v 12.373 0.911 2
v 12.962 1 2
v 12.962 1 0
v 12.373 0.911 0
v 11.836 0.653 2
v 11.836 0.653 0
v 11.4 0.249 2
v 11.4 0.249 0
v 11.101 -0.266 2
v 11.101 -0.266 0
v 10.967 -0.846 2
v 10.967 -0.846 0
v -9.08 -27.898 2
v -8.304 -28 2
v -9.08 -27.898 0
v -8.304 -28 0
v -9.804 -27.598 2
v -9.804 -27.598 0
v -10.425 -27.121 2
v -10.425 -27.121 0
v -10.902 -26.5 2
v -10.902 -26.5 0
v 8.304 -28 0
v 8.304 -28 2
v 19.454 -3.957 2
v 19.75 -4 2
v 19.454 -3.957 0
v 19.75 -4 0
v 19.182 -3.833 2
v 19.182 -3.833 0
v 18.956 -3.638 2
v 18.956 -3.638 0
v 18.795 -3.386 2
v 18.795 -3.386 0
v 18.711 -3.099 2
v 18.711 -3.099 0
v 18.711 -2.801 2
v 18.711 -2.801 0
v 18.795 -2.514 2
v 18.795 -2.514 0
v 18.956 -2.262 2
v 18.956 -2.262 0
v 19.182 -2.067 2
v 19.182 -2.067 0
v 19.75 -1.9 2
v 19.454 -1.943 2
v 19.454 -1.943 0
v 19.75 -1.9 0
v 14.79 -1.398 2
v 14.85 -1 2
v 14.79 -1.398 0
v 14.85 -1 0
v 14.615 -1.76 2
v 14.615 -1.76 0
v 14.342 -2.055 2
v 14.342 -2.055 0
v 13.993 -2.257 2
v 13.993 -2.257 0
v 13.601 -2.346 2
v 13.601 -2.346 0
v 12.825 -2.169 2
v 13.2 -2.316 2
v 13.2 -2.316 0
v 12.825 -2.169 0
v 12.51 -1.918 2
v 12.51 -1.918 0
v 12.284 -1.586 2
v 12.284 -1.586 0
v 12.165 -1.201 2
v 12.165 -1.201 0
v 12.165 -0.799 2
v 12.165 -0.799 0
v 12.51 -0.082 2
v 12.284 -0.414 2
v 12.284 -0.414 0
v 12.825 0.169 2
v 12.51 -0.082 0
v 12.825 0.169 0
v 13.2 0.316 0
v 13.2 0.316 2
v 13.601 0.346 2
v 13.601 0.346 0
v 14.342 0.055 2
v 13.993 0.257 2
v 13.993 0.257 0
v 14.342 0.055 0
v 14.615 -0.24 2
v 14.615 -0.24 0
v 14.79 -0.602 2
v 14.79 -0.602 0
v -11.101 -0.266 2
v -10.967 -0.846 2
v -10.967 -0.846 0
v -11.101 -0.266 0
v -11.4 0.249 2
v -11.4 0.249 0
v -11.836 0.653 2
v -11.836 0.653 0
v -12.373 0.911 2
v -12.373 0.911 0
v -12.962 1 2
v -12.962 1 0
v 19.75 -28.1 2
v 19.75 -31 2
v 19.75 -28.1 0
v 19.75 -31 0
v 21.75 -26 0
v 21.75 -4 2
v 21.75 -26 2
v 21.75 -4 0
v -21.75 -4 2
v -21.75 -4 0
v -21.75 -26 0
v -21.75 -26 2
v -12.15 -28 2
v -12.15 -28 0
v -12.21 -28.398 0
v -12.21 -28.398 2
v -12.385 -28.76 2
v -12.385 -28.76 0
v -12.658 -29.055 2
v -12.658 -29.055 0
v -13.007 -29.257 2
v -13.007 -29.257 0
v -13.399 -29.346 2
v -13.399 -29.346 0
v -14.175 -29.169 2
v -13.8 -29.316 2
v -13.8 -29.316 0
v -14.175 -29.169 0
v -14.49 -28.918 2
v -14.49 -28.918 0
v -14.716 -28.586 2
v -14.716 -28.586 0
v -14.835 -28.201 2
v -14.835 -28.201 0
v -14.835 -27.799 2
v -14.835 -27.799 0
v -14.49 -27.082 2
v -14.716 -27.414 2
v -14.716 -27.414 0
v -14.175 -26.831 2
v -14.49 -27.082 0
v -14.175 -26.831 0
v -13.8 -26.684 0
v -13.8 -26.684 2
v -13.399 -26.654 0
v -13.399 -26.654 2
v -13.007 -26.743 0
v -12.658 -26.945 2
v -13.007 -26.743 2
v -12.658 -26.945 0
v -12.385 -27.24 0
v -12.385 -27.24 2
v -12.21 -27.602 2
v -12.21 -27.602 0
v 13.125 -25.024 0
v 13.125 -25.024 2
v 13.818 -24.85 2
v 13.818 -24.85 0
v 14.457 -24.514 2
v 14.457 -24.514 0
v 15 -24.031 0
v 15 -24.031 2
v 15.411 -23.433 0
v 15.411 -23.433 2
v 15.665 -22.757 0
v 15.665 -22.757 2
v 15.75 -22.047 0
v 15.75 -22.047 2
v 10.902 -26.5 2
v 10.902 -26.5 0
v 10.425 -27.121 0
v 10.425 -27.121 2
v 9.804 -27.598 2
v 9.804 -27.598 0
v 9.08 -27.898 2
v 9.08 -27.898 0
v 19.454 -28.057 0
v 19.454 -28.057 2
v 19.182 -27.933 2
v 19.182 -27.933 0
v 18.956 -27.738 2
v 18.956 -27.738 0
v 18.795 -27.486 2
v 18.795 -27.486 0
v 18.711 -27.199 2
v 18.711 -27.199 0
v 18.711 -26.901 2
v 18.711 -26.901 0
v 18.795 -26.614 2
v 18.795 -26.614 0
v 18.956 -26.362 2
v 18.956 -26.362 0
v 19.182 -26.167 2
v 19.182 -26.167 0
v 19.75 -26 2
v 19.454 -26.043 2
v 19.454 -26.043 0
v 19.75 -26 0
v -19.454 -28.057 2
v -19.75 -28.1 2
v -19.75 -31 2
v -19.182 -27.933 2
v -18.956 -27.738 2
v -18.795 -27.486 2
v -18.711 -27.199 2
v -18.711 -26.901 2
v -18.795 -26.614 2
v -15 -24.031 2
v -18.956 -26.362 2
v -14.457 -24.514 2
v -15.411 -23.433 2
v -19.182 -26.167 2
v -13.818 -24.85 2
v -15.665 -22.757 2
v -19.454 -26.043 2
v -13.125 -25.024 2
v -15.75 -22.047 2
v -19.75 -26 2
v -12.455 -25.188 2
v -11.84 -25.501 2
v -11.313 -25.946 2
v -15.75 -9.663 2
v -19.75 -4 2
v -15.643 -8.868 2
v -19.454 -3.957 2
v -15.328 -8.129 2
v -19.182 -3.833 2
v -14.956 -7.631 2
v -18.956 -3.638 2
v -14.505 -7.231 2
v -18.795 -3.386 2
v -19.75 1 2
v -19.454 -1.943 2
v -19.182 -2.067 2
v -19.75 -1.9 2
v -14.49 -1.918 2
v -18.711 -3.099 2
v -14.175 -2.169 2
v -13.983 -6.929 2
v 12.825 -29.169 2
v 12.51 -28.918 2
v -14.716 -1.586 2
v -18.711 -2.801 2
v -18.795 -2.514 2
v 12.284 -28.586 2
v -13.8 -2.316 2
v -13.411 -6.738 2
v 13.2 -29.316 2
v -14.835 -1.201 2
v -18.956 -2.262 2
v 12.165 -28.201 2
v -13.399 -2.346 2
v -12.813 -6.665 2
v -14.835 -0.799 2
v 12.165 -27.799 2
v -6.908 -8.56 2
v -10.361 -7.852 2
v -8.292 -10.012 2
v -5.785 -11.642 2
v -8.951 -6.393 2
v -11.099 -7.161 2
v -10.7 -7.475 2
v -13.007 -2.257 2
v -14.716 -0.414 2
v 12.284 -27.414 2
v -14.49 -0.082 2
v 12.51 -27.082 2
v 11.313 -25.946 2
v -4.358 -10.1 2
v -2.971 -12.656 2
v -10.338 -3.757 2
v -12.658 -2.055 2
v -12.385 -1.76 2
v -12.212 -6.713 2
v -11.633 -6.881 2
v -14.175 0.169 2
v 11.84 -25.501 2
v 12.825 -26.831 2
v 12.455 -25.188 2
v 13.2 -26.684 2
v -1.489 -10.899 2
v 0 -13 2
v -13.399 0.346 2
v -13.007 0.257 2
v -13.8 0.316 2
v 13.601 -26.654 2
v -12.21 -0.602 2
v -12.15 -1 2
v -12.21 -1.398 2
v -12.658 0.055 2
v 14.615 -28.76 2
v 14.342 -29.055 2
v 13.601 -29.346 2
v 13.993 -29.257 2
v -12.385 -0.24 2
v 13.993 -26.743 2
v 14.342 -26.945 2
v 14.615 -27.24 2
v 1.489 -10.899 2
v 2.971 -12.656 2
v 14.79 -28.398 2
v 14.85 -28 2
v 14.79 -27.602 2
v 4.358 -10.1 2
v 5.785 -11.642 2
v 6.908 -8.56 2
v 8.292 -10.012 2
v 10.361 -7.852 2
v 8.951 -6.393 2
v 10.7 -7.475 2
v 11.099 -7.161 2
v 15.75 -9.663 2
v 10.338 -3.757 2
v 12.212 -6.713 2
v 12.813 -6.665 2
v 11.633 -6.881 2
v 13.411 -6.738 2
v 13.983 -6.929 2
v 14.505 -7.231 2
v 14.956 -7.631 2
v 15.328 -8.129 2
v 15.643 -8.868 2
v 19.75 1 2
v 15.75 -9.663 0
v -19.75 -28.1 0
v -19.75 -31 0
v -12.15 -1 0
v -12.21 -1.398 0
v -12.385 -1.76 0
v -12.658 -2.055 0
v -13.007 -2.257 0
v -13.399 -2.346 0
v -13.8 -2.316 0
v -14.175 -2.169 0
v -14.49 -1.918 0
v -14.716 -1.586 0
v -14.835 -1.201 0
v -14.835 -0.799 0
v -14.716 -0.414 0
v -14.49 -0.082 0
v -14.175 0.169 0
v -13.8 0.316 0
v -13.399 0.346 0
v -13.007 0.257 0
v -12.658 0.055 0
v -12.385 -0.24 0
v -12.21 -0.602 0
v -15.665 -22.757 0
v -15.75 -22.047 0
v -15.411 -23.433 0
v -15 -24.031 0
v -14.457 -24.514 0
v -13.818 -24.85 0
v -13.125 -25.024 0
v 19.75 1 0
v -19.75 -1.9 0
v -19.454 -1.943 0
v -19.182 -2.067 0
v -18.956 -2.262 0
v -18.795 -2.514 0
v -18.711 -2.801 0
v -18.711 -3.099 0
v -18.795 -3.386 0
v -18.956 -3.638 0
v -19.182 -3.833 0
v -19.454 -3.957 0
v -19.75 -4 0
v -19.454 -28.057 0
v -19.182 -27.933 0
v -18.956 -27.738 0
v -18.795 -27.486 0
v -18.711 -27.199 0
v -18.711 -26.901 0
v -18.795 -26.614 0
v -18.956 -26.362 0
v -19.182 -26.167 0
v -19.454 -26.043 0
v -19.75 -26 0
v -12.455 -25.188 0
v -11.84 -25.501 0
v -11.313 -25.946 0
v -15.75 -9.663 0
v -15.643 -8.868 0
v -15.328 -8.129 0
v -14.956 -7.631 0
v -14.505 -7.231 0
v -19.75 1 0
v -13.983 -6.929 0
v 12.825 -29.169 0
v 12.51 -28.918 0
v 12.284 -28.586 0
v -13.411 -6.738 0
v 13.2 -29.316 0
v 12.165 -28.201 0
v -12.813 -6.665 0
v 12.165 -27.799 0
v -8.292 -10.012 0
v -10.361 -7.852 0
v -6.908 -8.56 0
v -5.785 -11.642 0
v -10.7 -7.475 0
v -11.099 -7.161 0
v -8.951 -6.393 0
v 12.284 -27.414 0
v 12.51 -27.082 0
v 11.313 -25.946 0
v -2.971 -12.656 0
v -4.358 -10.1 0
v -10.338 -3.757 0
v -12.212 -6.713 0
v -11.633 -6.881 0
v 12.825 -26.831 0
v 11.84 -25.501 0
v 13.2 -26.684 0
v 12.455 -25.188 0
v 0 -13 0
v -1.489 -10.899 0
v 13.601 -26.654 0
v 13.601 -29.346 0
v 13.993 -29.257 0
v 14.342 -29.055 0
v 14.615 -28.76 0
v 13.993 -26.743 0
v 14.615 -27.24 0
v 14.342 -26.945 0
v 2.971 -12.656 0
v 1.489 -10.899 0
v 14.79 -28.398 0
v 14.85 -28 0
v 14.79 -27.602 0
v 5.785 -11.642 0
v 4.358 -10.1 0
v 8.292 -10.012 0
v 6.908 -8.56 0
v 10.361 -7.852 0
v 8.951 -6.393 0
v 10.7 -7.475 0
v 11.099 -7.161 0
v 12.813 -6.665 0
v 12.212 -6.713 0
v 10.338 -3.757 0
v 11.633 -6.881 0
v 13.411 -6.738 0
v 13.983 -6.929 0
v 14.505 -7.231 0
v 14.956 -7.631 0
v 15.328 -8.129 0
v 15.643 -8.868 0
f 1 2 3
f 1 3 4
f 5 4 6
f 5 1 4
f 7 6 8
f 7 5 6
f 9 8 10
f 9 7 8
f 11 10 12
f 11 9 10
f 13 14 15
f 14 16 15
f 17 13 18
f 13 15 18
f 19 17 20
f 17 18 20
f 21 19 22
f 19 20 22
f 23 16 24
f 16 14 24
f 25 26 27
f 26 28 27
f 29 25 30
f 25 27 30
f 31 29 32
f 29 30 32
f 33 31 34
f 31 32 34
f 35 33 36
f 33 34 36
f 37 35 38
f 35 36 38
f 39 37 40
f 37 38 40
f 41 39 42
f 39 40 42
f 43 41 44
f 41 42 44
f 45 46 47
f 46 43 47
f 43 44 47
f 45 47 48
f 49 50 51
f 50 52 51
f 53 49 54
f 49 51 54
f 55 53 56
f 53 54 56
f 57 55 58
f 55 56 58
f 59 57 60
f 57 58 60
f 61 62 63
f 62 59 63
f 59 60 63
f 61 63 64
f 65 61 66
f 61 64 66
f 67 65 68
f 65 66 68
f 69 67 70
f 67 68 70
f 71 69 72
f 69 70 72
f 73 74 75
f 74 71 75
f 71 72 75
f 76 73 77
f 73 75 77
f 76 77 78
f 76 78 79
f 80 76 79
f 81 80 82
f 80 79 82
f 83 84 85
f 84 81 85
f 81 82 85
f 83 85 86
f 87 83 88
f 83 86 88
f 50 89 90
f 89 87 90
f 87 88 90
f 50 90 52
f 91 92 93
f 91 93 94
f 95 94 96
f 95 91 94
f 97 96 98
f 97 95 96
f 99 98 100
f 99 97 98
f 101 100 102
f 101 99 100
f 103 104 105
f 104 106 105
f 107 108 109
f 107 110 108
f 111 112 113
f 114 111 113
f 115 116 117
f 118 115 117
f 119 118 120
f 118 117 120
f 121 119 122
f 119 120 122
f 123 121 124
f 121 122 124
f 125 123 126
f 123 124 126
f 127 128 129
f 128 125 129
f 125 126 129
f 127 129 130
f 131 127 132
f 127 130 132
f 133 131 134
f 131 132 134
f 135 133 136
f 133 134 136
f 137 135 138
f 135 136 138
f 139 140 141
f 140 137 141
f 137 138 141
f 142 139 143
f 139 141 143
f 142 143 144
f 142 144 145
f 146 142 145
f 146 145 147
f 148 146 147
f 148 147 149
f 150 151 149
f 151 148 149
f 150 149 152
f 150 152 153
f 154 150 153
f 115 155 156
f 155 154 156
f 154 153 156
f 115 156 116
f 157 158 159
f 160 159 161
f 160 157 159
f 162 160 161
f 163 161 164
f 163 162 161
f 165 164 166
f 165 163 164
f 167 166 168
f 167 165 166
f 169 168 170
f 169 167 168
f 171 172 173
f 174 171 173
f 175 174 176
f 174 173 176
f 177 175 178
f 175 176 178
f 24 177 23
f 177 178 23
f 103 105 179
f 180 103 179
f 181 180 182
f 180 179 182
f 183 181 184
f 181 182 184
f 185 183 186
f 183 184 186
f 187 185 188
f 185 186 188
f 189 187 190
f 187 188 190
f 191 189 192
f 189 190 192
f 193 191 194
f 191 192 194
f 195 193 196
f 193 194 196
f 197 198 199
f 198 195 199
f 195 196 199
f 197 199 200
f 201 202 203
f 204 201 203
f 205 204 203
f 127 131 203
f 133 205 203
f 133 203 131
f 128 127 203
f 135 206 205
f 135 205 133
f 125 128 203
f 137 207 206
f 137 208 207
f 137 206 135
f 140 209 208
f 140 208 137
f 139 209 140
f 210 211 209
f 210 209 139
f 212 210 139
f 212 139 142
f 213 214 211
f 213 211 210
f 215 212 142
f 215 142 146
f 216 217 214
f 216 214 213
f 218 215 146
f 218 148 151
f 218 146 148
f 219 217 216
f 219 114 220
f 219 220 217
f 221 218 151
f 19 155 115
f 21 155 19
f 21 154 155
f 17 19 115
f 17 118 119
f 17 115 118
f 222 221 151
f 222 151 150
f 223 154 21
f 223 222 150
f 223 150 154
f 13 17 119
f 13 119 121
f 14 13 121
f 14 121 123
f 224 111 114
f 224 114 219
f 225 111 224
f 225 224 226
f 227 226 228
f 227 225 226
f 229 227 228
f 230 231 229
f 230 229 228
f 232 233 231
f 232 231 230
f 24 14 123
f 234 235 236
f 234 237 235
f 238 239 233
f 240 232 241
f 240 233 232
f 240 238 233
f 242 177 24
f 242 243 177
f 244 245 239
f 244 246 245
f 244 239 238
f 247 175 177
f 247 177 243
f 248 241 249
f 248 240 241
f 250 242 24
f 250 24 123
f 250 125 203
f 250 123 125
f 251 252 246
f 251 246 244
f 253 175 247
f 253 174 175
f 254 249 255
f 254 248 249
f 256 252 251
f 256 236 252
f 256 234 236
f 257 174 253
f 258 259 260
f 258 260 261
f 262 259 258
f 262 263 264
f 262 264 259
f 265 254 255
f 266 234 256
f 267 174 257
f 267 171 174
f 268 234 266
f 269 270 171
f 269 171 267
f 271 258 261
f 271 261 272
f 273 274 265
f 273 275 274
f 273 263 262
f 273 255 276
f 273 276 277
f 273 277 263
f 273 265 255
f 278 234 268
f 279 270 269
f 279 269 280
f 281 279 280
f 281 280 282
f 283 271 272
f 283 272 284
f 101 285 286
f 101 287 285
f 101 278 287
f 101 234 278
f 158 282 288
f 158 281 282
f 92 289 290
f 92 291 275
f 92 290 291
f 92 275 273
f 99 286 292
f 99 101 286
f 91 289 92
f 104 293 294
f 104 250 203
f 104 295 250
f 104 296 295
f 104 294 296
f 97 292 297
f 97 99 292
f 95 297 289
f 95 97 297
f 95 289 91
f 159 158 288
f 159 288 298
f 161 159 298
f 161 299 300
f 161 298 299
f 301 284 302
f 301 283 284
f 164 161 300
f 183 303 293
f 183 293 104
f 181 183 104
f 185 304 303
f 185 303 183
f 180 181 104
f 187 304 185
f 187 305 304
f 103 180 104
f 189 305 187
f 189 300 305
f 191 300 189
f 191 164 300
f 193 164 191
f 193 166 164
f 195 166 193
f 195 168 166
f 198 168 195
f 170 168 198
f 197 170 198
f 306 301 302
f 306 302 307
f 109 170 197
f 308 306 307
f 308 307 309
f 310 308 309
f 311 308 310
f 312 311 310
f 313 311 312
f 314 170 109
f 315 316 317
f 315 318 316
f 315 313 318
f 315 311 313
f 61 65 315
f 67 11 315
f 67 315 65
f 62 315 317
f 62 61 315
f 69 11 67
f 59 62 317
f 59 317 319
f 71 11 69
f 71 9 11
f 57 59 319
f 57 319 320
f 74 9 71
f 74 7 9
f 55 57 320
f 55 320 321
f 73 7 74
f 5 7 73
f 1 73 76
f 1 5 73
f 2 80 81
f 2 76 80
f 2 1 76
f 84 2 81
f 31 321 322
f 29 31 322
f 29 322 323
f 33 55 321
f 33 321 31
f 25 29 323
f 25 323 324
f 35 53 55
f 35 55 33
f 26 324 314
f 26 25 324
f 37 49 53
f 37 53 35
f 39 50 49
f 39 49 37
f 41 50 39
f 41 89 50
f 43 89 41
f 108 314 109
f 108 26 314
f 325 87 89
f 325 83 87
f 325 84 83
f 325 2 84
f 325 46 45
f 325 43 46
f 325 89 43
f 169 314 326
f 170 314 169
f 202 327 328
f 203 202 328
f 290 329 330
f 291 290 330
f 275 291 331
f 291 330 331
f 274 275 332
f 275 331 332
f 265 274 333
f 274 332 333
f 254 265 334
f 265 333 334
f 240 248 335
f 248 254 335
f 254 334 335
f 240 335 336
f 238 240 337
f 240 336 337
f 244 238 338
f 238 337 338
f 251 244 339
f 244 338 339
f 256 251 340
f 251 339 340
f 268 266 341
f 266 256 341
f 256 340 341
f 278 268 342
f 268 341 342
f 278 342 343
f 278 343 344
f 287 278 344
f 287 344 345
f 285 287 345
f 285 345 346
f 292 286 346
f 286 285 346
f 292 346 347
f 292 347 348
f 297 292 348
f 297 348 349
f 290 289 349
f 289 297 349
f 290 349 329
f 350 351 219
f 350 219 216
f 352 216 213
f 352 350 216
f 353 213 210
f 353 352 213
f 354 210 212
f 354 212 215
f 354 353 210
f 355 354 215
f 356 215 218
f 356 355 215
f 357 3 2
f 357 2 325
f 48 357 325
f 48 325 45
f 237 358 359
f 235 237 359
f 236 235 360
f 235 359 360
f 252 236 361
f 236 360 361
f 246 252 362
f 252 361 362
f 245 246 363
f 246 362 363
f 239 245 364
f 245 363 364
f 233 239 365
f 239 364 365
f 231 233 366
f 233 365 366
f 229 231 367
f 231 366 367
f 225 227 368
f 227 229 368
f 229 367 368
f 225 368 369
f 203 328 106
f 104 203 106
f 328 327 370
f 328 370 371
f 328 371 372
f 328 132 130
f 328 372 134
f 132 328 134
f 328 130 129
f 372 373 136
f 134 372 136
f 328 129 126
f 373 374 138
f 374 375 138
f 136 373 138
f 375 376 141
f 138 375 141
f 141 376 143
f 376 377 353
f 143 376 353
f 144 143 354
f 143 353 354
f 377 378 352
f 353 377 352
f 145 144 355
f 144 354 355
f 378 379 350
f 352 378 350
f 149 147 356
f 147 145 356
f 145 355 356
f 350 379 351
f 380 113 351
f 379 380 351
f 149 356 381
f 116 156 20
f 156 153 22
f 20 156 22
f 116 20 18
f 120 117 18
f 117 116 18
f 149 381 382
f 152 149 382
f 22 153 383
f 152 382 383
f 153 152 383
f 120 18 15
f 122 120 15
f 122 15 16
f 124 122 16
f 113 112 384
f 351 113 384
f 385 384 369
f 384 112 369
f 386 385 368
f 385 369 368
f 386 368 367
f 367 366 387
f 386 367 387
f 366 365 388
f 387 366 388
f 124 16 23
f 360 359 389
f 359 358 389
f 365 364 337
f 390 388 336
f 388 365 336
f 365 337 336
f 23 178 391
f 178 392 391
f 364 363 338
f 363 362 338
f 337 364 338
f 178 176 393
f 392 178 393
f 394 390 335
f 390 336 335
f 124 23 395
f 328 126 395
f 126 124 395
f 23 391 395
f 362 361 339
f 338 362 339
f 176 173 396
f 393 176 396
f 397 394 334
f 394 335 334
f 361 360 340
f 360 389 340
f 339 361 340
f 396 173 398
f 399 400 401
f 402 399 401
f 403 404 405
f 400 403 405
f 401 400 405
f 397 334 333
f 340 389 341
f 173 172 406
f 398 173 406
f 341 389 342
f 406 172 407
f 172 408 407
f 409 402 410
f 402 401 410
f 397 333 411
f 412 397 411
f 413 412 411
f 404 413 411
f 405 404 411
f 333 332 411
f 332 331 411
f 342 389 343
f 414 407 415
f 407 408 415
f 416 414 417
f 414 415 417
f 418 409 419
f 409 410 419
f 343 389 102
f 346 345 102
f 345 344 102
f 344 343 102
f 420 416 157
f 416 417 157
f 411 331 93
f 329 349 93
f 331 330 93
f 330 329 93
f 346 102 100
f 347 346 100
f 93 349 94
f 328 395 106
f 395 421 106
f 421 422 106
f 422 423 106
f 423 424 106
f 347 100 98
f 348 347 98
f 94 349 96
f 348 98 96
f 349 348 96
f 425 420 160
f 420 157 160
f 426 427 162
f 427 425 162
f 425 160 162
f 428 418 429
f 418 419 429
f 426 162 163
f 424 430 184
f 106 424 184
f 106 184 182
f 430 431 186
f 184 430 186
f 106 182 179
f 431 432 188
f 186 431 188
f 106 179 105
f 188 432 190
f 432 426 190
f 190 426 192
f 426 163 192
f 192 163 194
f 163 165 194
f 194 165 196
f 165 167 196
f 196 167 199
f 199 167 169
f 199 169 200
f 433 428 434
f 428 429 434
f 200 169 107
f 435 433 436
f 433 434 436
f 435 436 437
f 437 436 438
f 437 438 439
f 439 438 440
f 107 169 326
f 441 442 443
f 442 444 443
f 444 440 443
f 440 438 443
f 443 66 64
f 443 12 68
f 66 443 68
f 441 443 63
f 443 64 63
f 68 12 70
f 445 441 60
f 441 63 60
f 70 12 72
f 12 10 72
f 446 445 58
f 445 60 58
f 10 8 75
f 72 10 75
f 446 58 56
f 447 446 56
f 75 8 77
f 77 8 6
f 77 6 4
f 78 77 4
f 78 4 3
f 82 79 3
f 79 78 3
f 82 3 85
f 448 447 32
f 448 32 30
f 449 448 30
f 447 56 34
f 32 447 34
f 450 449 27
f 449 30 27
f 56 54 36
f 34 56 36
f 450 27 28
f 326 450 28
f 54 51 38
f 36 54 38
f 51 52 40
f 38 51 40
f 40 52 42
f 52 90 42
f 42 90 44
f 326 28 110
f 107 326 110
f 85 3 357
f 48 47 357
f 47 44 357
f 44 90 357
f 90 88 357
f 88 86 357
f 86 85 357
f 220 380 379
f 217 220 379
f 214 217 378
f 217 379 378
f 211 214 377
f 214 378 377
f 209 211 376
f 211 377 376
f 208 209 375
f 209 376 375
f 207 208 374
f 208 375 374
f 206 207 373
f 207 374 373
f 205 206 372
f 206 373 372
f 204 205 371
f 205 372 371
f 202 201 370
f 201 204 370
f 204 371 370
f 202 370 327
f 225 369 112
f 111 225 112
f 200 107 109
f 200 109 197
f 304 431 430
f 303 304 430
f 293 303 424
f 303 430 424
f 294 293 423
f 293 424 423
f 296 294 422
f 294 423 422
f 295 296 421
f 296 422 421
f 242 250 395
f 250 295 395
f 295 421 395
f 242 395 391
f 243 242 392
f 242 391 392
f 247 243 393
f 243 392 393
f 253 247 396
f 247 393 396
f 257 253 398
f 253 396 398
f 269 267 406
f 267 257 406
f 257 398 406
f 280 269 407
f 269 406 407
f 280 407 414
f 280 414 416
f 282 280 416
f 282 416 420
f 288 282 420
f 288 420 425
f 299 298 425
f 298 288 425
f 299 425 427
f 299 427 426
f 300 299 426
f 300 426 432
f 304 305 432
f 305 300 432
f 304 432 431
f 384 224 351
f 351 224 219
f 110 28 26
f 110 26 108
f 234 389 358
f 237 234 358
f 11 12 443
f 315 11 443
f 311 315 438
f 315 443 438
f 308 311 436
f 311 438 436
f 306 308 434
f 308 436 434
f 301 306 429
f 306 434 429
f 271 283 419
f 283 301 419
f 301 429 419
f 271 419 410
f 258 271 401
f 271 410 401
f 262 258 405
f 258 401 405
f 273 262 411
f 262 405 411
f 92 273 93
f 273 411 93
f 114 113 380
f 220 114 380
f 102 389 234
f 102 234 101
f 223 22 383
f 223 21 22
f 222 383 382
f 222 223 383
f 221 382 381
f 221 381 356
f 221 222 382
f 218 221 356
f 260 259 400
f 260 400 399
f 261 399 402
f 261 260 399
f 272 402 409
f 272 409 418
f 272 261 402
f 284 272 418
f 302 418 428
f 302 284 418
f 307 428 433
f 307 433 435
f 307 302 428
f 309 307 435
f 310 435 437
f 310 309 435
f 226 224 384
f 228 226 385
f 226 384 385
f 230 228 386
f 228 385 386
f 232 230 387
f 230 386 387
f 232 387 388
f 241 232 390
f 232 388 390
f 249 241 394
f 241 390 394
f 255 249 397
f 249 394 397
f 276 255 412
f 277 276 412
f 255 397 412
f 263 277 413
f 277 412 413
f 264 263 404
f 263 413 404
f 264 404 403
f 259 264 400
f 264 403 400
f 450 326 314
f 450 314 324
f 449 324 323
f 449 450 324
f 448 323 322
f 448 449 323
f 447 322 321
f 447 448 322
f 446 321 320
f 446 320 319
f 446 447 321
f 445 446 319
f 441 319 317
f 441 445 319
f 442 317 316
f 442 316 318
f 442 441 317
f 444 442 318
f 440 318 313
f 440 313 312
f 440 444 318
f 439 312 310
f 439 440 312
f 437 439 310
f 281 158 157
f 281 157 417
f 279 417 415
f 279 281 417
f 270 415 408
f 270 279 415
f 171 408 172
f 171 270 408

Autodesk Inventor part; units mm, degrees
ref_plane "YZ Plane" through (0, 0, 0) normal (1, 0, 0) x (0, 1, 0)
ref_plane "XZ Plane" through (0, 0, 0) normal (0, 1, 0) x (-1, 0, 0)
ref_plane "XY Plane" through (0, 0, 0) normal (0, 0, 1) x (1, 0, 0)
sketch "スケッチ1" plane through (0, 0, 0) normal (0, 0, 1) x (1, 0, 0)
  circle A0 centre (0, 0) radius 10.5 construction
  line L0 (-13.5, -1) -> (13.5, -1) construction
  line L1 (13.5, -1) -> (13.5, -28) construction
  line L2 (13.5, -28) -> (-13.5, -28) construction
  line L3 (-13.5, -28) -> (-13.5, -1) construction
  circle A1 centre (-13.5, -1) radius 1.35
  circle A2 centre (13.5, -1) radius 1.35
  circle A3 centre (-13.5, -28) radius 1.35
  circle A4 centre (13.5, -28) radius 1.35
  line L4 (-19.75, 1) -> (-19.75, -1.9)
  line L5 (-19.75, -4) -> (-21.75, -4)
  line L6 (-21.75, -4) -> (-21.75, -26)
  line L7 (-21.75, -26) -> (-19.75, -26)
  line L8 (-19.75, -28.1) -> (-19.75, -31)
  line L9 (-19.75, -31) -> (19.75, -31)
  line L10 (19.75, -31) -> (19.75, -28.1)
  line L11 (19.75, -4) -> (21.75, -4)
  line L12 (21.75, -4) -> (21.75, -26)
  line L13 (21.75, -26) -> (19.75, -26)
  line L14 (0, 0) -> (0, -28) construction
  line L15 (-21.75, -15) -> (21.75, -15) construction
  arc A5 (-19.75, -4) -> (-19.75, -1.9) centre (-19.75, -2.95) ccw
  line L16 (-19.75, 1) -> (-10.9545, 1)
  circle A6 centre (-13.5, -1) radius 2 construction
  arc A7 (-19.75, -28.1) -> (-19.75, -26) centre (-19.75, -27.05) ccw
  arc A8 (19.75, -26) -> (19.75, -28.1) centre (19.75, -27.05) ccw
  line L17 (10.9545, 1) -> (19.75, 1)
  line L18 (19.75, 1) -> (19.75, -1.9)
  arc A9 (19.75, -1.9) -> (19.75, -4) centre (19.75, -2.95) ccw
  arc A10 (-10.9545, 1) -> (10.9545, 1) centre (0, 0) ccw
  point P0 (0, -1)
  dimension "d0" = 21
  dimension "d1" = 1
  dimension "d2" = 27
  dimension "d3" = 2.7
  dimension "d6" = 27
  dimension "d9" = 27
  dimension "d12" = 15
  dimension "d27" = 22
  dimension "d35" = 2
  dimension "d37" = 1.05
  dimension "d41" = 5
  dimension "d42" = 4
  dimension "d43" = 0.5
  dimension "d44" = 39.5
extrude "押し出し1" add sketch "スケッチ1" along normal blind 2
sketch "スケッチ2" plane through (0, 0, 2) normal (0, 0, 1) x (1, 0, 0)
  circle A0 centre (13.5, -28) radius 1.35 projected
  circle A1 centre (-13.5, -28) radius 1.35 projected
  circle A2 centre (13.5, -1) radius 1.35 projected
  circle A3 centre (-13.5, -1) radius 1.35 projected
  line L0 (-19.75, 1) -> (-19.75, -1.9) projected
  line L1 (-19.75, -31) -> (19.75, -31) projected
  arc A4 (-10.9545, 1) -> (10.9545, 1) centre (0, 0) ccw projected
  line L2 (-15.75, -2.9843) -> (-15.75, -25)
  line L3 (-15.75, -25) -> (-13.5, -25)
  arc A5 (-10.5, -28) -> (-13.5, -25) centre (-13.5, -28) ccw
  arc A6 (-15.75, -2.9843) -> (-12.4312, -3.8032) centre (-13.5, -1) ccw
  arc A7 (-12.4312, -3.8032) -> (12.4312, -3.8032) centre (0, 0) ccw
  arc A8 (12.4312, -3.8032) -> (15.75, -2.9843) centre (13.5, -1) ccw
  line L4 (15.75, -2.9843) -> (15.75, -25)
  line L5 (15.75, -25) -> (13.5, -25)
  arc A9 (13.5, -25) -> (10.5, -28) centre (13.5, -28) ccw
  line L6 (-10.5, -28) -> (10.5, -28)
  line L7 (0, 0) -> (0, -31) construction
  dimension "d47" = 3
  dimension "d48" = 4
  dimension "d49" = 2
  dimension "d50" = 3
extrude "押し出し2" cut sketch "スケッチ2" against normal blind 10 contours A6 A7 A8 L4 L5 A9 L6 A5 L3 L2
fillet "フィレット1" radius 3 8 edges at (-15.75, -2.9843, 1) (-12.4312, -3.8032, 1) (15.75, -2.9843, 1) (12.4312, -3.8032, 1) (-15.75, -25, 1) (-10.5, -28, 1) (15.75, -25, 1) (10.5, -28, 1)
fillet "フィレット1" radius 2 2 edges at (-10.9545, 1, 1) (10.9545, 1, 1)
equation "\"d6\" = d2"
equation "\"d9\" = d2"
equation "\"d12\" = d20"
equation "\"d27\" = d17"
equation "\"d41\" = d18"
equation "\"d17\" = 22"
equation "\"d18\" = 5"
equation "\"d20\" = 15"
properties part number "付け根_サブフレーム_1_1" material "アルミニウム 2014-T4"
